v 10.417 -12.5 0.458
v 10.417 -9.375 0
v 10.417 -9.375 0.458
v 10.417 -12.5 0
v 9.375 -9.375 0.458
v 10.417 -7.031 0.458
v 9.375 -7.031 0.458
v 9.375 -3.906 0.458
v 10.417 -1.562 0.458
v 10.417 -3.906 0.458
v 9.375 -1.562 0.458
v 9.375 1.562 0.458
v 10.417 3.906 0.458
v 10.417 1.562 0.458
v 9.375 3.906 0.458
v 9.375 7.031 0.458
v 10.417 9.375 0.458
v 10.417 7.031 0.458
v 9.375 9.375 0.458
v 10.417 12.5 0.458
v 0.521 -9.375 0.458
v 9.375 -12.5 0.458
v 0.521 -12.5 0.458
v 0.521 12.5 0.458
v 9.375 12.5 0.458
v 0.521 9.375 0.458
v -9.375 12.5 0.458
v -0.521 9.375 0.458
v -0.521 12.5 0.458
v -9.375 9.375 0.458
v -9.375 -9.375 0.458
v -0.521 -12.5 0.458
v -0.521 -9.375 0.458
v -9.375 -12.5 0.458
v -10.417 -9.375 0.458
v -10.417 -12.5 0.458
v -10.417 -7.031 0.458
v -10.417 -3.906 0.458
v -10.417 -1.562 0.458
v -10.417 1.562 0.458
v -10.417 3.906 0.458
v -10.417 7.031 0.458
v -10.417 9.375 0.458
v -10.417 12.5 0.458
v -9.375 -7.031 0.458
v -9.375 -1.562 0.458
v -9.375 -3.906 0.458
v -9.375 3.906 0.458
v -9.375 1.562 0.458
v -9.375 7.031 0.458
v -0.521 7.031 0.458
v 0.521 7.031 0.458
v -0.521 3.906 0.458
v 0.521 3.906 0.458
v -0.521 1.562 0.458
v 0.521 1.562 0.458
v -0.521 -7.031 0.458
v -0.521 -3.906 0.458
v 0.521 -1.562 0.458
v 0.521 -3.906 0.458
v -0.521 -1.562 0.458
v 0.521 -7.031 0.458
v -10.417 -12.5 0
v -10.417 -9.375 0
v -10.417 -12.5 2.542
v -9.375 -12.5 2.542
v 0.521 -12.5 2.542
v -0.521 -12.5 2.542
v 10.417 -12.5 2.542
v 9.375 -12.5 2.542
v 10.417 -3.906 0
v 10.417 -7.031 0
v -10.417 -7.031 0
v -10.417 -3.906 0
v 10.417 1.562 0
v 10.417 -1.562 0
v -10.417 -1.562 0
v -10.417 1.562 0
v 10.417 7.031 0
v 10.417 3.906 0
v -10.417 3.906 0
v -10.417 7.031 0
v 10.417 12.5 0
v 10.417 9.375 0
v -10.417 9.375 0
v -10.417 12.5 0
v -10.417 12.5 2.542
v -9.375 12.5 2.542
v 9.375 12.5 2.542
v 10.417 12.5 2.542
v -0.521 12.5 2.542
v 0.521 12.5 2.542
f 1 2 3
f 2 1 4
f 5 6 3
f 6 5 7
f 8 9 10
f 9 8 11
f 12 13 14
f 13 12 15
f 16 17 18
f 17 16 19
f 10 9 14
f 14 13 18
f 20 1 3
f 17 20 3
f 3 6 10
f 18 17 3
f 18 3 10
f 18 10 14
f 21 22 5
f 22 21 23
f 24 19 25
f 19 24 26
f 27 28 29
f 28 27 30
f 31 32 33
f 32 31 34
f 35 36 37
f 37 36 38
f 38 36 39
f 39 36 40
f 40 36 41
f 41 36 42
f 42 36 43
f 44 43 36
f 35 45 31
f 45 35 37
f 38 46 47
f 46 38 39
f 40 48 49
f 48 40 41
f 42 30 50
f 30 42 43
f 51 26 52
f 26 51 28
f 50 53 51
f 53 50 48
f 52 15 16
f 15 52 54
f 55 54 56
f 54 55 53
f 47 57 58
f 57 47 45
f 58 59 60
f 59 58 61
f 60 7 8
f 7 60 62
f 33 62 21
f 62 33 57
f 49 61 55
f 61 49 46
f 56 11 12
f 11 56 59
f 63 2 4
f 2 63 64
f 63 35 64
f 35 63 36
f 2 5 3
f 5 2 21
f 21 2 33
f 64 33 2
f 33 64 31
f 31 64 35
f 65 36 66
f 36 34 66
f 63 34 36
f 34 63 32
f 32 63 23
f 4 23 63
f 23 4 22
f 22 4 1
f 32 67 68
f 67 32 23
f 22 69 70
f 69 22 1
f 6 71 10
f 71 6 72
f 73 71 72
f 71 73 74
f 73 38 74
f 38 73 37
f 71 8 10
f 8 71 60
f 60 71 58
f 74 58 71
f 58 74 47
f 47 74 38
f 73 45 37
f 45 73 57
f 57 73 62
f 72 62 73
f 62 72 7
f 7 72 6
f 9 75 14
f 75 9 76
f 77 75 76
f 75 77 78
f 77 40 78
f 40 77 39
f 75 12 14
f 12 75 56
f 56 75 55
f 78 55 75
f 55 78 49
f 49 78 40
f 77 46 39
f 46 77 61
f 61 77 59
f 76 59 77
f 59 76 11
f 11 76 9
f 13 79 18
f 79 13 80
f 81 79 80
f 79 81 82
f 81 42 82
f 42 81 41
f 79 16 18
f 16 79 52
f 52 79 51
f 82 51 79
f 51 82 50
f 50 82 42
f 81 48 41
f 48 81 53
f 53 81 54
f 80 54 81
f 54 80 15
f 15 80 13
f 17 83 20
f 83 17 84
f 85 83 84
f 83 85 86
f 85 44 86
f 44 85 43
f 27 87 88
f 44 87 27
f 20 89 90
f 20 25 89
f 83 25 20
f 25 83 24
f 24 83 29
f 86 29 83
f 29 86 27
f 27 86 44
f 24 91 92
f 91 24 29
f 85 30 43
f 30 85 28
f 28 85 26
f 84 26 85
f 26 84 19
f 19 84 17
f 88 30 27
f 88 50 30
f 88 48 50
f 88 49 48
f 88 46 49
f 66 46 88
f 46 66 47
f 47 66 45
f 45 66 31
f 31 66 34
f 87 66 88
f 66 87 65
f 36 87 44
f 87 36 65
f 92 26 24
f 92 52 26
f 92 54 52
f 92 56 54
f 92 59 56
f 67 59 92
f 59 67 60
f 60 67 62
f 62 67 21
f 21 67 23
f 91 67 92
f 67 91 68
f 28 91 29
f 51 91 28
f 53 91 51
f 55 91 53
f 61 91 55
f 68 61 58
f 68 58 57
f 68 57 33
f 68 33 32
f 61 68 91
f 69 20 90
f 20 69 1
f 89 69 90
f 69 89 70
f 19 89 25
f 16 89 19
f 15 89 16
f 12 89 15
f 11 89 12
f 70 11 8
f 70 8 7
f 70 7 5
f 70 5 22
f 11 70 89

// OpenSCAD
scaleFactor = 1/48;

palletLength			= 1200;
palletWidth				= 1000;

plankWidth            = 150;
plankHeight           = 22;
numberOfPlanks        = 5;
plankLength           = palletWidth;
distanceBetweenPlanks = (palletLength - (plankWidth*numberOfPlanks))/(numberOfPlanks-1);

supportBeamWidth = 50;
supportBeamHeight = 100;
numberOfSupportBeams = 3;
supportBeamLength = (numberOfPlanks*plankWidth) + ((numberOfPlanks-1)*distanceBetweenPlanks);
distanceBetweenBeams = (palletWidth - (numberOfSupportBeams*supportBeamWidth))/(numberOfSupportBeams-1);


module plank(scale, offsety)
{
	translate([(-plankLength/2)*scale,offsety*scale,0*scale])
		cube([plankLength*scale,plankWidth*scale,plankHeight*scale]);
}

module beam(scale, offsetx)
{
	translate([offsetx*scale,0*scale,plankHeight*scale])
		cube([supportBeamWidth*scale,supportBeamLength*scale,supportBeamHeight*scale]);
}

module pallet()
{
	//determine how far the model needs to be translated (in Y) to align with the origin in x-y
	palletTranslateValue = -((numberOfPlanks*plankWidth)/2)*scaleFactor +
                          -(((numberOfPlanks-1)*distanceBetweenPlanks)/2)*scaleFactor;


	beamTranslateValue = -((numberOfSupportBeams*supportBeamWidth)/2)*scaleFactor +
                        -(((numberOfSupportBeams-1)*distanceBetweenBeams)/2)*scaleFactor;

	translate([0,palletTranslateValue,0])
	{
		//generate "top" planks (on bottom of model)
		for(plankCount = [0 : numberOfPlanks-1])
		{
			plank(scaleFactor, distanceBetweenPlanks*plankCount + plankWidth*plankCount);
		}

		translate([beamTranslateValue, 0, 0])
		{
			//generate support beams
			for(supportBeamCount = [0 : numberOfSupportBeams-1])
			{
				beam(scaleFactor, supportBeamCount*(distanceBetweenBeams + supportBeamWidth));
			}
		}
	}
}

pallet();
